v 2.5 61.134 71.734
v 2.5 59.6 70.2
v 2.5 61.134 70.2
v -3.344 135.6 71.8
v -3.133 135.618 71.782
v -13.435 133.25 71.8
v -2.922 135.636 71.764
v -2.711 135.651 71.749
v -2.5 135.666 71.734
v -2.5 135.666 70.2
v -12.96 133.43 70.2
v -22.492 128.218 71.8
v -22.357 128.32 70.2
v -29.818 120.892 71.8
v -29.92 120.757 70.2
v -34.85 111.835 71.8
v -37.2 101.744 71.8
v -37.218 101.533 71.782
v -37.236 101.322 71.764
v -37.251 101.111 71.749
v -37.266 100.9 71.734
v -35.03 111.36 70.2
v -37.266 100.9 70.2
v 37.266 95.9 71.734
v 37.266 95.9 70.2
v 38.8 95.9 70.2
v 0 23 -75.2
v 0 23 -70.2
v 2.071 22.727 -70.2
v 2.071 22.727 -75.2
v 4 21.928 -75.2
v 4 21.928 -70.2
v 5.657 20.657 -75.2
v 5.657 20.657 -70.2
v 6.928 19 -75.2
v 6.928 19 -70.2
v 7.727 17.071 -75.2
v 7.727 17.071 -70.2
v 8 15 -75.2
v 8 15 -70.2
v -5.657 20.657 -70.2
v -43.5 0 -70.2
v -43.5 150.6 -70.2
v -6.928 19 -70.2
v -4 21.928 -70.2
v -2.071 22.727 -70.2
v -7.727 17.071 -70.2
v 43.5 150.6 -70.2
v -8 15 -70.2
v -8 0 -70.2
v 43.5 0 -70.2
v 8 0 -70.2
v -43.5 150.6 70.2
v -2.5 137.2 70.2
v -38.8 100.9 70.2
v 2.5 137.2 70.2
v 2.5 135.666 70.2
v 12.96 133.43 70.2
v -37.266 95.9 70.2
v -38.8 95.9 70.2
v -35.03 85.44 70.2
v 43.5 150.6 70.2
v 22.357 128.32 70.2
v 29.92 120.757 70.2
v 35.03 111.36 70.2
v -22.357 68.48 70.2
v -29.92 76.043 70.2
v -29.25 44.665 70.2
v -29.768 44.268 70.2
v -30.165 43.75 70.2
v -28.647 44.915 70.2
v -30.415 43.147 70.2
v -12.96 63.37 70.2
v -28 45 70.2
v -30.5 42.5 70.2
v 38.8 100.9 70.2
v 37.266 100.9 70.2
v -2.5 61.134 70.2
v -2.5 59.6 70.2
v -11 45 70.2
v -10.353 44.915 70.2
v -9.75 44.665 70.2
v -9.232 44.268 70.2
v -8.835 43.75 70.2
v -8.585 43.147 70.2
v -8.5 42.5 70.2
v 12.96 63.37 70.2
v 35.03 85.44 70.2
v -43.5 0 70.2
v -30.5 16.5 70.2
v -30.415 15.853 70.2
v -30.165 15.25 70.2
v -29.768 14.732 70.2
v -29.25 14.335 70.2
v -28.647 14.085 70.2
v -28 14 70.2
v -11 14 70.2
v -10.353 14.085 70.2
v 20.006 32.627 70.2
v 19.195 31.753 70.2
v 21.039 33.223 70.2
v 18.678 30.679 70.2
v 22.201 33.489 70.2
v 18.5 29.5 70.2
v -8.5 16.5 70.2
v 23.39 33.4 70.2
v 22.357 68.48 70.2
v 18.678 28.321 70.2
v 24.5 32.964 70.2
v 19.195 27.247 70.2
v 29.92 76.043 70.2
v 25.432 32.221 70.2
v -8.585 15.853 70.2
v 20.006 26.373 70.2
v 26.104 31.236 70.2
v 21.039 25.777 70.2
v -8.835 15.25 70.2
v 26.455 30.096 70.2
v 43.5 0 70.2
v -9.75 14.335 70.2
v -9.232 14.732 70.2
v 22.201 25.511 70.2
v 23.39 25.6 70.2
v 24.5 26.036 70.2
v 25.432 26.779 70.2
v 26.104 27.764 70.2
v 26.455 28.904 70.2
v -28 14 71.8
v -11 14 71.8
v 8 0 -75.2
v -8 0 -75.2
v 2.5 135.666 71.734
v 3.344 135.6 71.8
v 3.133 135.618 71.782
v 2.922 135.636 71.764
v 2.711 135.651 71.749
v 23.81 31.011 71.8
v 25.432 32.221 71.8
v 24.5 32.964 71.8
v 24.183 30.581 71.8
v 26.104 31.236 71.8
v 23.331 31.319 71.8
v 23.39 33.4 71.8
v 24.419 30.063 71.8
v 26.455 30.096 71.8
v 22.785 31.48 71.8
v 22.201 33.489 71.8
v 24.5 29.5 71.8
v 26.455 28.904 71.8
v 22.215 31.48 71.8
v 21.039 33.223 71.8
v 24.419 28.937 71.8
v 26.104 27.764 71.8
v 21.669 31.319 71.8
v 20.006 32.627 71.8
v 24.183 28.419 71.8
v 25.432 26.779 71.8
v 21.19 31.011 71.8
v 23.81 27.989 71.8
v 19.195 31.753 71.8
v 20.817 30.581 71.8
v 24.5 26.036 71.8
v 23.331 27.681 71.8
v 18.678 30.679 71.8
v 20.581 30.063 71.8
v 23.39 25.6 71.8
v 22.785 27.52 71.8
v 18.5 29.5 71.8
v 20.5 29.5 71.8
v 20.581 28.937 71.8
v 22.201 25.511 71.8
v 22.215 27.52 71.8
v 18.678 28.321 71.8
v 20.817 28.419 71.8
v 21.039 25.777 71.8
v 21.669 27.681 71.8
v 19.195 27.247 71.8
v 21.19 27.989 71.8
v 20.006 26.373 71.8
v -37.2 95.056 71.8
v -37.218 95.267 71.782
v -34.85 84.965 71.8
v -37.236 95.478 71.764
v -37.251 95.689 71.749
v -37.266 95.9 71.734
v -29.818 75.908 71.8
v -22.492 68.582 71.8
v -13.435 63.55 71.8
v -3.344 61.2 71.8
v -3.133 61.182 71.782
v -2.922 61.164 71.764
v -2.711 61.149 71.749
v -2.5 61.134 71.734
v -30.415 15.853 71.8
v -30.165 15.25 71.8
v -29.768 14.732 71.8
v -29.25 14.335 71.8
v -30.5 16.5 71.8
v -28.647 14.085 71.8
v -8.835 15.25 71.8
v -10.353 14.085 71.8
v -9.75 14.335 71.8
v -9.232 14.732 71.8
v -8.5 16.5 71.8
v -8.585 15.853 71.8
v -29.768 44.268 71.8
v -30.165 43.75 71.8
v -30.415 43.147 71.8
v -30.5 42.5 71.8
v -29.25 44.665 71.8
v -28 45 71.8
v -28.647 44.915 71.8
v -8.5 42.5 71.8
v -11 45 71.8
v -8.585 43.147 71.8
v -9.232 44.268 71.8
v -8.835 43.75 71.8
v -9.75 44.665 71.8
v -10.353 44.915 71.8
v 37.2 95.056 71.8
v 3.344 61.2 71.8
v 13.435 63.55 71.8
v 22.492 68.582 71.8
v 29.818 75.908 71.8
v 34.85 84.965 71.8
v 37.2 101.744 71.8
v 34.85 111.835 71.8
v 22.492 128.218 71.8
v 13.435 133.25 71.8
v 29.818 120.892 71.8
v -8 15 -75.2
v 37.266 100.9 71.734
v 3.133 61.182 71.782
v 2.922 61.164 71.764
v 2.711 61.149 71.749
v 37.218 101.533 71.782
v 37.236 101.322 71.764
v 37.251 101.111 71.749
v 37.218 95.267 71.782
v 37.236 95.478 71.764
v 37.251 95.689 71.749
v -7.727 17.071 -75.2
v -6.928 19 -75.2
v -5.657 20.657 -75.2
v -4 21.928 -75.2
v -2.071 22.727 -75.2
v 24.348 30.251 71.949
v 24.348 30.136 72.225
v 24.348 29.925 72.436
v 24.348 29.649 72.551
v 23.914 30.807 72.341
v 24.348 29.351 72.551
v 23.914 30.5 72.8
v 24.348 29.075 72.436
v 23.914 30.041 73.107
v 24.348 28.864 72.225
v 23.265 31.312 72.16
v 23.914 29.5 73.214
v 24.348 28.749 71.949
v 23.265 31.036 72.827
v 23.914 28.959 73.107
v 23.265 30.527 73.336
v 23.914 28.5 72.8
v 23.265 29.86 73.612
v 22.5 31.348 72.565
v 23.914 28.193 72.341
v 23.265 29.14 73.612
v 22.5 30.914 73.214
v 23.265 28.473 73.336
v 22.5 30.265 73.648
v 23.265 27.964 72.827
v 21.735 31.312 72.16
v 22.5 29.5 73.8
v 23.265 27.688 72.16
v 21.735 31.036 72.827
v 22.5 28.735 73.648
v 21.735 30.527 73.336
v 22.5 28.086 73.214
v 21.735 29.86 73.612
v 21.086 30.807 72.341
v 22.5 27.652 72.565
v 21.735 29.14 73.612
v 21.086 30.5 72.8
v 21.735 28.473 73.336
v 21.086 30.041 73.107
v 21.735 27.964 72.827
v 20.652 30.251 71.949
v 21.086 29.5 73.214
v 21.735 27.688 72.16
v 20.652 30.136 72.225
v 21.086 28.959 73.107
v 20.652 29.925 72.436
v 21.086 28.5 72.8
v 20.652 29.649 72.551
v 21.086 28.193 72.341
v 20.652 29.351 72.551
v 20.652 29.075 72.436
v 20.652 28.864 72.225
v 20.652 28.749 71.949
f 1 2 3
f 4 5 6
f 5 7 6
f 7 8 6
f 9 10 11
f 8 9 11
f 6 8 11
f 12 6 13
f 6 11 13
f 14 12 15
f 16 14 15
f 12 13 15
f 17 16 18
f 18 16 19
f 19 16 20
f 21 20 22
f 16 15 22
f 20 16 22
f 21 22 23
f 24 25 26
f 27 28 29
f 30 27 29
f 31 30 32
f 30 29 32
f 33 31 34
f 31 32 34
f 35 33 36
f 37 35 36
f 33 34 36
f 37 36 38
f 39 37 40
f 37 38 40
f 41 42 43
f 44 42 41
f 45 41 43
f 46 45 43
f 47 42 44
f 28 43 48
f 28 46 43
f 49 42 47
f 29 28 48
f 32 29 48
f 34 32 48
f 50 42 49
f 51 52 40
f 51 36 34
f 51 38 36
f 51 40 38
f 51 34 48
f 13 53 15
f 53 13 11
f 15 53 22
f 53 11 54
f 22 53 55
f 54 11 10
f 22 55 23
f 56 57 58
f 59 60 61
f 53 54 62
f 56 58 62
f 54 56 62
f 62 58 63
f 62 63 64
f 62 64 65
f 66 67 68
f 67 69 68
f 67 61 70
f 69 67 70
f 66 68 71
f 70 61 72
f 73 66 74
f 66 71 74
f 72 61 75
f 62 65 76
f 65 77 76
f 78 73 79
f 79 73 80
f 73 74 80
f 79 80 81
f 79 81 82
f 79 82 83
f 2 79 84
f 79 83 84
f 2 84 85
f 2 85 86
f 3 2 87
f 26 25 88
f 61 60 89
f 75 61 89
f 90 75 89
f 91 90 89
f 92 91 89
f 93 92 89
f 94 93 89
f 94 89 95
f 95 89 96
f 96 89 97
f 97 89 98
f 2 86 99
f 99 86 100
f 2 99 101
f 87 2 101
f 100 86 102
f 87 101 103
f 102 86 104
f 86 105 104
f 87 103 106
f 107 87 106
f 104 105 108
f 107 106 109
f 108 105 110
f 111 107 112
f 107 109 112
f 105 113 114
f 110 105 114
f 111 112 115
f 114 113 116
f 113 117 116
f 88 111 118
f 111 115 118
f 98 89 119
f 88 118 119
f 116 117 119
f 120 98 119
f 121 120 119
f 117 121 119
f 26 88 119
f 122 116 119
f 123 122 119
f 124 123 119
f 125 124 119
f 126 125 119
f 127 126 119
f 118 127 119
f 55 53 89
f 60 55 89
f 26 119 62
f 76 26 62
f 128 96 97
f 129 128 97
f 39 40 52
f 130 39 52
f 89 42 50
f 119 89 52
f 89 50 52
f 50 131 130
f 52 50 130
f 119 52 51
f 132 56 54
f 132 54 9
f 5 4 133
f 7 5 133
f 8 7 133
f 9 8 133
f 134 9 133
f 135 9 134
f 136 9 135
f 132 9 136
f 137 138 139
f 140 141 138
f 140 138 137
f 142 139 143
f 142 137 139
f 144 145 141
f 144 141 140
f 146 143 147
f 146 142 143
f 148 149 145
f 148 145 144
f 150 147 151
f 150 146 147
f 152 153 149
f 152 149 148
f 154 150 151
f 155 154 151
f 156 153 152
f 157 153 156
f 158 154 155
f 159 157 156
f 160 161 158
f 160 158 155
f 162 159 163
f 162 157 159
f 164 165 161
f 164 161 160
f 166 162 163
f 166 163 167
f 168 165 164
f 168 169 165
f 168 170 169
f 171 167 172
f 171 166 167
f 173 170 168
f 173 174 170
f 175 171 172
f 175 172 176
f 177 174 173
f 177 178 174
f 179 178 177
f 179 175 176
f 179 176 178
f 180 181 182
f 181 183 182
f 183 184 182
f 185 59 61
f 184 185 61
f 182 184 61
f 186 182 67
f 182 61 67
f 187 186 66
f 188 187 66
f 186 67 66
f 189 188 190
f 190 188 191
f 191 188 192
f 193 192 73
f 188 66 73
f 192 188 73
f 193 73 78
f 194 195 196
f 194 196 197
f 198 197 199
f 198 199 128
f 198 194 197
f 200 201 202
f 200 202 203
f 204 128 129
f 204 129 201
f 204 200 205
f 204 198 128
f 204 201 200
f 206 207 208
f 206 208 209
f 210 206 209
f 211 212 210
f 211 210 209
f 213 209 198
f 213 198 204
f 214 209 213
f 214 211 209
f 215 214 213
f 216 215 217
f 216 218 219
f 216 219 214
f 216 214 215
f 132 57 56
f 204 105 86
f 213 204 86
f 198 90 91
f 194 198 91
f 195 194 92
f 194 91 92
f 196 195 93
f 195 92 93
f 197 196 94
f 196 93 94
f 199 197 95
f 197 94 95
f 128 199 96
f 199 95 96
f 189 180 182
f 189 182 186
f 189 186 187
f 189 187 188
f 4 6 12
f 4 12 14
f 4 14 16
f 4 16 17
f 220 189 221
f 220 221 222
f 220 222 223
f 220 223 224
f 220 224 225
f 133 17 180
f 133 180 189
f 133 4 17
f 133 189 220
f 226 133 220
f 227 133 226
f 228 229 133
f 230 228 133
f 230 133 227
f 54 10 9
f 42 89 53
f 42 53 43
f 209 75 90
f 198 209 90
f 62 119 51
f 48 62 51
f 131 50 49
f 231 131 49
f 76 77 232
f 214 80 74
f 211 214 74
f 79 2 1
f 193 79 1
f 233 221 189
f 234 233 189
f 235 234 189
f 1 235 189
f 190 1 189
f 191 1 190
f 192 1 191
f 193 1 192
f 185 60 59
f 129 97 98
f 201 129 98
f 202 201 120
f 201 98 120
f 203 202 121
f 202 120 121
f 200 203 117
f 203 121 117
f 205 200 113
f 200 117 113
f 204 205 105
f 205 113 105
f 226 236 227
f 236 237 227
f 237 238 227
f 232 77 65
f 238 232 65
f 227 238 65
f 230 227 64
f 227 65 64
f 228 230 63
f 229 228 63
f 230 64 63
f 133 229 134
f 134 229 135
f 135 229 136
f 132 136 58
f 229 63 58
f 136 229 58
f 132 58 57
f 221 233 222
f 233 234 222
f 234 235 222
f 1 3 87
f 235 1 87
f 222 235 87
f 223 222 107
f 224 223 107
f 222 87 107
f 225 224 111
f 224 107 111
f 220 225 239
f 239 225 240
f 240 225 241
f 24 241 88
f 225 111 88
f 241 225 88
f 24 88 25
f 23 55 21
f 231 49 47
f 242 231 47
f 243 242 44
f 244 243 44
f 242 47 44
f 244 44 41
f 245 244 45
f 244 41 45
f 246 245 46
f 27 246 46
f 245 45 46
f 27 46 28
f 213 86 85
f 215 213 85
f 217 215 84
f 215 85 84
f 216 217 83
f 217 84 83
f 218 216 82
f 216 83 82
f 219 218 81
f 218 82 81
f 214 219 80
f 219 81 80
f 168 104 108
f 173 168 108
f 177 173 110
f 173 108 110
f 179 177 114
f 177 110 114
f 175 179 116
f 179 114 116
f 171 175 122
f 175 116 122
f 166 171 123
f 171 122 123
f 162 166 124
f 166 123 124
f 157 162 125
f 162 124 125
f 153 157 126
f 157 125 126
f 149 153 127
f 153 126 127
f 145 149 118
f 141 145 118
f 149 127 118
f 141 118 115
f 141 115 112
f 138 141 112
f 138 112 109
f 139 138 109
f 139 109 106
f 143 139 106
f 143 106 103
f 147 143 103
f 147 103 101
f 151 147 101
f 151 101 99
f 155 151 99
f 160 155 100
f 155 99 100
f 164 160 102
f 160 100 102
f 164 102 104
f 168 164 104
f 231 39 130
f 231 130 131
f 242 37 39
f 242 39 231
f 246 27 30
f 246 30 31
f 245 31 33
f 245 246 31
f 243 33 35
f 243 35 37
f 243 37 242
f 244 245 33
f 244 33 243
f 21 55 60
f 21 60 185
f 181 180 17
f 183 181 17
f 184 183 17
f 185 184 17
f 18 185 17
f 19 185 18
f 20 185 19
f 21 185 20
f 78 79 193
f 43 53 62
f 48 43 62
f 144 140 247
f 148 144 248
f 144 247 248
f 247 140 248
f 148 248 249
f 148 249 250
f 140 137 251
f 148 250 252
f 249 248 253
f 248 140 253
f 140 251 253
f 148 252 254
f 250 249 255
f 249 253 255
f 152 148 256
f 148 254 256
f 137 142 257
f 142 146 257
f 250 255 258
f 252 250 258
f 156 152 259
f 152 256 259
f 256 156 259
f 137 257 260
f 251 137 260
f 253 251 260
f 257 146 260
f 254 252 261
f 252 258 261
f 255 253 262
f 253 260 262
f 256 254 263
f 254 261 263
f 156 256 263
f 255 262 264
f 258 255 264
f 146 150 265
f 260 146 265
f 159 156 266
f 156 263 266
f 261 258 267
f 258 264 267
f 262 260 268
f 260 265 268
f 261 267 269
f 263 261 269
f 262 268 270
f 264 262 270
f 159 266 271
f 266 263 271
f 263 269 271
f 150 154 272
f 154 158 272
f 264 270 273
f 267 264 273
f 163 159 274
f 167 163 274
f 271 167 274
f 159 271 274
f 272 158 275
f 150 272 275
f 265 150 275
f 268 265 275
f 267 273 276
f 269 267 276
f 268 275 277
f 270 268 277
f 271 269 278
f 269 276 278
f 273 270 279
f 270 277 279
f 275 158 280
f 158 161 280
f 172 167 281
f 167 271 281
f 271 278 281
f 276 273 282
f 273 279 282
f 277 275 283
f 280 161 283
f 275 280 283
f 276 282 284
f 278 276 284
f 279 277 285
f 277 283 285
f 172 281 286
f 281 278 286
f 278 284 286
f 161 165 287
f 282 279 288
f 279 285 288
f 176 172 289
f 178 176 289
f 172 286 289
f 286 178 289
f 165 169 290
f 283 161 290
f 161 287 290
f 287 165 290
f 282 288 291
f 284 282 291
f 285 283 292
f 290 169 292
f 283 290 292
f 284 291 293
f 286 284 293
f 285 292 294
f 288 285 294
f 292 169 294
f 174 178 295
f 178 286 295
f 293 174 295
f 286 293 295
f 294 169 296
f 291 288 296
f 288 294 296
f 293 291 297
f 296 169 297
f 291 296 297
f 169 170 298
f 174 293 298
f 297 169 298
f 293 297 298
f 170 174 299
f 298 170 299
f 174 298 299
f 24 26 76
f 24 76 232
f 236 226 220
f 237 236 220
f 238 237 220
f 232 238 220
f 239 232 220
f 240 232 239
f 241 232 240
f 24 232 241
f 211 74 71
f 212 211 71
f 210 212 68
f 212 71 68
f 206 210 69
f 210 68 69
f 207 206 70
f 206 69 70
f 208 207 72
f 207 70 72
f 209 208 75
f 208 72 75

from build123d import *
from build123d.topology import SkipClean

# Parameters (mm, degrees)
ESQUISSE1_W        = 87
ESQUISSE1_H        = 140.4
BOSS_EXTRU_1_DEPTH = 150.6
ESQUISSE2_W        = 2.433761929
ESQUISSE2_H        = 5
ESQUISSE2_W_2      = 5
ESQUISSE2_H_2      = 2.433761929
ESQUISSE2_R        = 4
BOSS_EXTRU_5_DEPTH = 1.6
R_VOLUTION1_ANGLE  = 180
CHANFREIN1_SIZE    = 2.5
BOSS_EXTRU_6_DEPTH = 5


with BuildPart() as part:
    # Esquisse1 → Boss.-Extru.1 (new body)
    with BuildSketch(Plane(origin=(0, 0, 0), x_dir=(1, 0, 0), z_dir=(0, 1, 0))):
        Rectangle(ESQUISSE1_W, ESQUISSE1_H)
    extrude(amount=BOSS_EXTRU_1_DEPTH)

    # Esquisse2 → Boss.-Extru.5 (add)
    with BuildSketch(Plane.XY.offset(70.2)):
        with BuildLine():
            Line((-37.266238071, 100.9), (-37.266238071, 95.9))
            ThreePointArc((-37.266238071, 95.9), (-26.410438277, 71.989561723), (-2.5, 61.133761929))
            Line((-2.5, 61.133761929), (2.5, 61.133761929))
            ThreePointArc((2.5, 61.133761929), (26.410438277, 71.989561723), (37.266238071, 95.9))
            Line((37.266238071, 95.9), (37.266238071, 100.9))
            ThreePointArc((37.266238071, 100.9), (26.410438277, 124.810438277), (2.5, 135.666238071))
            Line((2.5, 135.666238071), (-2.5, 135.666238071))
            ThreePointArc((-2.5, 135.666238071), (-26.410438277, 124.810438277), (-37.266238071, 100.9))
        make_face()
        with Locations((38.483119036, 98.4)):
            Rectangle(ESQUISSE2_W, ESQUISSE2_H)
        with Locations((0, 136.883119036)):
            Rectangle(ESQUISSE2_W_2, ESQUISSE2_H_2)
        with Locations((-38.483119036, 98.4)):
            Rectangle(ESQUISSE2_W, ESQUISSE2_H)
        with Locations((0, 59.916880965)):
            Rectangle(ESQUISSE2_W_2, ESQUISSE2_H_2)
        with BuildLine():
            Line((-11, 45), (-28, 45))
            ThreePointArc((-28, 45), (-29.767766953, 44.267766953), (-30.5, 42.5))
            Line((-30.5, 42.5), (-30.5, 16.5))
            ThreePointArc((-30.5, 16.5), (-29.767766953, 14.732233047), (-28, 14))
            Line((-28, 14), (-11, 14))
            ThreePointArc((-11, 14), (-9.232233047, 14.732233047), (-8.5, 16.5))
            Line((-8.5, 16.5), (-8.5, 42.5))
            ThreePointArc((-8.5, 42.5), (-9.232233047, 44.267766953), (-11, 45))
        make_face()
        with Locations(Location((22.5, 29.5, 0), (0, 0, 180))):
            Circle(ESQUISSE2_R)
    extrude(amount=BOSS_EXTRU_5_DEPTH)

    # Esquisse3 → Révolution1 (revolve)
    with SkipClean():  # the faces are left unmerged after this step: merging them gives an invalid solid
        with BuildSketch(Plane.XY.offset(71.8)):
            with BuildLine():
                ThreePointArc((24.5, 29.5), (22.5, 31.5), (20.5, 29.5))
                Line((20.5, 29.5), (24.5, 29.5))
            make_face()
            with BuildLine():
                Line((24.5, 29.5), (20.5, 29.5))
                ThreePointArc((20.5, 29.5), (22.5, 27.5), (24.5, 29.5))
            make_face()
        revolve(axis=Axis((20.5, 29.5, 71.8), (1, 0, 0)), revolution_arc=R_VOLUTION1_ANGLE)

    # Chanfrein1
    # the kernel refuses this chamfer: 2.5 mm, written as the material it adds along each edge
    # the kernel refuses this chamfer: 2.5 mm, written as the material it takes off along each edge
    with BuildSketch(Plane(origin=(8.92920747, 58.7, 71.8), x_dir=(0, -0.027495876610587663, -0.9996219169112968), z_dir=(-1, 0, 0))) as chanfrein1_2_piece_1_section:
        Polygon((CHANFREIN1_SIZE * 0.999621916911, -CHANFREIN1_SIZE * 0.0274958766106), (-CHANFREIN1_SIZE * 0.0274958766106, -CHANFREIN1_SIZE * 0.999621916911), (0, 0), align=None)
    chanfrein1_2_piece_1 = extrude(amount=17.85841494, mode=Mode.PRIVATE)
    chanfrein1_2_piece_1 = split(chanfrein1_2_piece_1, bisect_by=Plane(origin=(2.719982047, 61.166365842, 70.2), z_dir=(0, 0, 1)), keep=Keep.TOP, mode=Mode.PRIVATE)
    add(chanfrein1_2_piece_1, mode=Mode.SUBTRACT)
    with BuildSketch(Plane(origin=(-39.7, 89.47079253, 71.8), x_dir=(-0.027495876610587663, 0, -0.9996219169112968), z_dir=(0, 1, 0))) as chanfrein1_2_piece_2_section:
        Polygon((CHANFREIN1_SIZE * 0.999621916911, -CHANFREIN1_SIZE * 0.0274958766106), (-CHANFREIN1_SIZE * 0.0274958766106, -CHANFREIN1_SIZE * 0.999621916911), (0, 0), align=None)
    chanfrein1_2_piece_2 = extrude(amount=17.85841494, mode=Mode.PRIVATE)
    chanfrein1_2_piece_2 = split(chanfrein1_2_piece_2, bisect_by=Plane(origin=(-37.233634158, 95.680017953, 70.2), z_dir=(0, 0, 1)), keep=Keep.TOP, mode=Mode.PRIVATE)
    add(chanfrein1_2_piece_2, mode=Mode.SUBTRACT)
    with BuildSketch(Plane(origin=(-8.92920747, 138.1, 71.8), x_dir=(0, 0.02749587661058214, -0.9996219169112969), z_dir=(1, 0, 0))) as chanfrein1_2_piece_3_section:
        Polygon((CHANFREIN1_SIZE * 0.999621916911, -CHANFREIN1_SIZE * 0.0274958766106), (-CHANFREIN1_SIZE * 0.0274958766106, -CHANFREIN1_SIZE * 0.999621916911), (0, 0), align=None)
    chanfrein1_2_piece_3 = extrude(amount=17.85841494, mode=Mode.PRIVATE)
    chanfrein1_2_piece_3 = split(chanfrein1_2_piece_3, bisect_by=Plane(origin=(-2.719982047, 135.633634158, 70.2), z_dir=(0, 0, 1)), keep=Keep.TOP, mode=Mode.PRIVATE)
    add(chanfrein1_2_piece_3, mode=Mode.SUBTRACT)
    with BuildSketch(Plane(origin=(39.7, 107.32920747, 71.8), x_dir=(0.027495876610587663, 0, -0.9996219169112968), z_dir=(0, -1, 0))) as chanfrein1_2_piece_4_section:
        Polygon((CHANFREIN1_SIZE * 0.999621916911, -CHANFREIN1_SIZE * 0.0274958766106), (-CHANFREIN1_SIZE * 0.0274958766106, -CHANFREIN1_SIZE * 0.999621916911), (0, 0), align=None)
    chanfrein1_2_piece_4 = extrude(amount=17.85841494, mode=Mode.PRIVATE)
    chanfrein1_2_piece_4 = split(chanfrein1_2_piece_4, bisect_by=Plane(origin=(37.233634158, 101.119982047, 70.2), z_dir=(0, 0, 1)), keep=Keep.TOP, mode=Mode.PRIVATE)
    add(chanfrein1_2_piece_4, mode=Mode.SUBTRACT)

    # Esquisse4 → Boss.-Extru.6 (add)
    with BuildSketch(Plane(origin=(0, 0, -70.2), x_dir=(-1, 0, 0), z_dir=(0, 0, -1))):
        with BuildLine():
            Line((-8, 15), (-8, 0))
            Line((-8, 0), (8, 0))
            Line((8, 0), (8, 15))
            ThreePointArc((8, 15), (5.656854249, 20.656854249), (0, 23))
            ThreePointArc((0, 23), (-5.656854249, 20.656854249), (-8, 15))
        make_face()
    extrude(amount=BOSS_EXTRU_6_DEPTH)


solid = part.part
